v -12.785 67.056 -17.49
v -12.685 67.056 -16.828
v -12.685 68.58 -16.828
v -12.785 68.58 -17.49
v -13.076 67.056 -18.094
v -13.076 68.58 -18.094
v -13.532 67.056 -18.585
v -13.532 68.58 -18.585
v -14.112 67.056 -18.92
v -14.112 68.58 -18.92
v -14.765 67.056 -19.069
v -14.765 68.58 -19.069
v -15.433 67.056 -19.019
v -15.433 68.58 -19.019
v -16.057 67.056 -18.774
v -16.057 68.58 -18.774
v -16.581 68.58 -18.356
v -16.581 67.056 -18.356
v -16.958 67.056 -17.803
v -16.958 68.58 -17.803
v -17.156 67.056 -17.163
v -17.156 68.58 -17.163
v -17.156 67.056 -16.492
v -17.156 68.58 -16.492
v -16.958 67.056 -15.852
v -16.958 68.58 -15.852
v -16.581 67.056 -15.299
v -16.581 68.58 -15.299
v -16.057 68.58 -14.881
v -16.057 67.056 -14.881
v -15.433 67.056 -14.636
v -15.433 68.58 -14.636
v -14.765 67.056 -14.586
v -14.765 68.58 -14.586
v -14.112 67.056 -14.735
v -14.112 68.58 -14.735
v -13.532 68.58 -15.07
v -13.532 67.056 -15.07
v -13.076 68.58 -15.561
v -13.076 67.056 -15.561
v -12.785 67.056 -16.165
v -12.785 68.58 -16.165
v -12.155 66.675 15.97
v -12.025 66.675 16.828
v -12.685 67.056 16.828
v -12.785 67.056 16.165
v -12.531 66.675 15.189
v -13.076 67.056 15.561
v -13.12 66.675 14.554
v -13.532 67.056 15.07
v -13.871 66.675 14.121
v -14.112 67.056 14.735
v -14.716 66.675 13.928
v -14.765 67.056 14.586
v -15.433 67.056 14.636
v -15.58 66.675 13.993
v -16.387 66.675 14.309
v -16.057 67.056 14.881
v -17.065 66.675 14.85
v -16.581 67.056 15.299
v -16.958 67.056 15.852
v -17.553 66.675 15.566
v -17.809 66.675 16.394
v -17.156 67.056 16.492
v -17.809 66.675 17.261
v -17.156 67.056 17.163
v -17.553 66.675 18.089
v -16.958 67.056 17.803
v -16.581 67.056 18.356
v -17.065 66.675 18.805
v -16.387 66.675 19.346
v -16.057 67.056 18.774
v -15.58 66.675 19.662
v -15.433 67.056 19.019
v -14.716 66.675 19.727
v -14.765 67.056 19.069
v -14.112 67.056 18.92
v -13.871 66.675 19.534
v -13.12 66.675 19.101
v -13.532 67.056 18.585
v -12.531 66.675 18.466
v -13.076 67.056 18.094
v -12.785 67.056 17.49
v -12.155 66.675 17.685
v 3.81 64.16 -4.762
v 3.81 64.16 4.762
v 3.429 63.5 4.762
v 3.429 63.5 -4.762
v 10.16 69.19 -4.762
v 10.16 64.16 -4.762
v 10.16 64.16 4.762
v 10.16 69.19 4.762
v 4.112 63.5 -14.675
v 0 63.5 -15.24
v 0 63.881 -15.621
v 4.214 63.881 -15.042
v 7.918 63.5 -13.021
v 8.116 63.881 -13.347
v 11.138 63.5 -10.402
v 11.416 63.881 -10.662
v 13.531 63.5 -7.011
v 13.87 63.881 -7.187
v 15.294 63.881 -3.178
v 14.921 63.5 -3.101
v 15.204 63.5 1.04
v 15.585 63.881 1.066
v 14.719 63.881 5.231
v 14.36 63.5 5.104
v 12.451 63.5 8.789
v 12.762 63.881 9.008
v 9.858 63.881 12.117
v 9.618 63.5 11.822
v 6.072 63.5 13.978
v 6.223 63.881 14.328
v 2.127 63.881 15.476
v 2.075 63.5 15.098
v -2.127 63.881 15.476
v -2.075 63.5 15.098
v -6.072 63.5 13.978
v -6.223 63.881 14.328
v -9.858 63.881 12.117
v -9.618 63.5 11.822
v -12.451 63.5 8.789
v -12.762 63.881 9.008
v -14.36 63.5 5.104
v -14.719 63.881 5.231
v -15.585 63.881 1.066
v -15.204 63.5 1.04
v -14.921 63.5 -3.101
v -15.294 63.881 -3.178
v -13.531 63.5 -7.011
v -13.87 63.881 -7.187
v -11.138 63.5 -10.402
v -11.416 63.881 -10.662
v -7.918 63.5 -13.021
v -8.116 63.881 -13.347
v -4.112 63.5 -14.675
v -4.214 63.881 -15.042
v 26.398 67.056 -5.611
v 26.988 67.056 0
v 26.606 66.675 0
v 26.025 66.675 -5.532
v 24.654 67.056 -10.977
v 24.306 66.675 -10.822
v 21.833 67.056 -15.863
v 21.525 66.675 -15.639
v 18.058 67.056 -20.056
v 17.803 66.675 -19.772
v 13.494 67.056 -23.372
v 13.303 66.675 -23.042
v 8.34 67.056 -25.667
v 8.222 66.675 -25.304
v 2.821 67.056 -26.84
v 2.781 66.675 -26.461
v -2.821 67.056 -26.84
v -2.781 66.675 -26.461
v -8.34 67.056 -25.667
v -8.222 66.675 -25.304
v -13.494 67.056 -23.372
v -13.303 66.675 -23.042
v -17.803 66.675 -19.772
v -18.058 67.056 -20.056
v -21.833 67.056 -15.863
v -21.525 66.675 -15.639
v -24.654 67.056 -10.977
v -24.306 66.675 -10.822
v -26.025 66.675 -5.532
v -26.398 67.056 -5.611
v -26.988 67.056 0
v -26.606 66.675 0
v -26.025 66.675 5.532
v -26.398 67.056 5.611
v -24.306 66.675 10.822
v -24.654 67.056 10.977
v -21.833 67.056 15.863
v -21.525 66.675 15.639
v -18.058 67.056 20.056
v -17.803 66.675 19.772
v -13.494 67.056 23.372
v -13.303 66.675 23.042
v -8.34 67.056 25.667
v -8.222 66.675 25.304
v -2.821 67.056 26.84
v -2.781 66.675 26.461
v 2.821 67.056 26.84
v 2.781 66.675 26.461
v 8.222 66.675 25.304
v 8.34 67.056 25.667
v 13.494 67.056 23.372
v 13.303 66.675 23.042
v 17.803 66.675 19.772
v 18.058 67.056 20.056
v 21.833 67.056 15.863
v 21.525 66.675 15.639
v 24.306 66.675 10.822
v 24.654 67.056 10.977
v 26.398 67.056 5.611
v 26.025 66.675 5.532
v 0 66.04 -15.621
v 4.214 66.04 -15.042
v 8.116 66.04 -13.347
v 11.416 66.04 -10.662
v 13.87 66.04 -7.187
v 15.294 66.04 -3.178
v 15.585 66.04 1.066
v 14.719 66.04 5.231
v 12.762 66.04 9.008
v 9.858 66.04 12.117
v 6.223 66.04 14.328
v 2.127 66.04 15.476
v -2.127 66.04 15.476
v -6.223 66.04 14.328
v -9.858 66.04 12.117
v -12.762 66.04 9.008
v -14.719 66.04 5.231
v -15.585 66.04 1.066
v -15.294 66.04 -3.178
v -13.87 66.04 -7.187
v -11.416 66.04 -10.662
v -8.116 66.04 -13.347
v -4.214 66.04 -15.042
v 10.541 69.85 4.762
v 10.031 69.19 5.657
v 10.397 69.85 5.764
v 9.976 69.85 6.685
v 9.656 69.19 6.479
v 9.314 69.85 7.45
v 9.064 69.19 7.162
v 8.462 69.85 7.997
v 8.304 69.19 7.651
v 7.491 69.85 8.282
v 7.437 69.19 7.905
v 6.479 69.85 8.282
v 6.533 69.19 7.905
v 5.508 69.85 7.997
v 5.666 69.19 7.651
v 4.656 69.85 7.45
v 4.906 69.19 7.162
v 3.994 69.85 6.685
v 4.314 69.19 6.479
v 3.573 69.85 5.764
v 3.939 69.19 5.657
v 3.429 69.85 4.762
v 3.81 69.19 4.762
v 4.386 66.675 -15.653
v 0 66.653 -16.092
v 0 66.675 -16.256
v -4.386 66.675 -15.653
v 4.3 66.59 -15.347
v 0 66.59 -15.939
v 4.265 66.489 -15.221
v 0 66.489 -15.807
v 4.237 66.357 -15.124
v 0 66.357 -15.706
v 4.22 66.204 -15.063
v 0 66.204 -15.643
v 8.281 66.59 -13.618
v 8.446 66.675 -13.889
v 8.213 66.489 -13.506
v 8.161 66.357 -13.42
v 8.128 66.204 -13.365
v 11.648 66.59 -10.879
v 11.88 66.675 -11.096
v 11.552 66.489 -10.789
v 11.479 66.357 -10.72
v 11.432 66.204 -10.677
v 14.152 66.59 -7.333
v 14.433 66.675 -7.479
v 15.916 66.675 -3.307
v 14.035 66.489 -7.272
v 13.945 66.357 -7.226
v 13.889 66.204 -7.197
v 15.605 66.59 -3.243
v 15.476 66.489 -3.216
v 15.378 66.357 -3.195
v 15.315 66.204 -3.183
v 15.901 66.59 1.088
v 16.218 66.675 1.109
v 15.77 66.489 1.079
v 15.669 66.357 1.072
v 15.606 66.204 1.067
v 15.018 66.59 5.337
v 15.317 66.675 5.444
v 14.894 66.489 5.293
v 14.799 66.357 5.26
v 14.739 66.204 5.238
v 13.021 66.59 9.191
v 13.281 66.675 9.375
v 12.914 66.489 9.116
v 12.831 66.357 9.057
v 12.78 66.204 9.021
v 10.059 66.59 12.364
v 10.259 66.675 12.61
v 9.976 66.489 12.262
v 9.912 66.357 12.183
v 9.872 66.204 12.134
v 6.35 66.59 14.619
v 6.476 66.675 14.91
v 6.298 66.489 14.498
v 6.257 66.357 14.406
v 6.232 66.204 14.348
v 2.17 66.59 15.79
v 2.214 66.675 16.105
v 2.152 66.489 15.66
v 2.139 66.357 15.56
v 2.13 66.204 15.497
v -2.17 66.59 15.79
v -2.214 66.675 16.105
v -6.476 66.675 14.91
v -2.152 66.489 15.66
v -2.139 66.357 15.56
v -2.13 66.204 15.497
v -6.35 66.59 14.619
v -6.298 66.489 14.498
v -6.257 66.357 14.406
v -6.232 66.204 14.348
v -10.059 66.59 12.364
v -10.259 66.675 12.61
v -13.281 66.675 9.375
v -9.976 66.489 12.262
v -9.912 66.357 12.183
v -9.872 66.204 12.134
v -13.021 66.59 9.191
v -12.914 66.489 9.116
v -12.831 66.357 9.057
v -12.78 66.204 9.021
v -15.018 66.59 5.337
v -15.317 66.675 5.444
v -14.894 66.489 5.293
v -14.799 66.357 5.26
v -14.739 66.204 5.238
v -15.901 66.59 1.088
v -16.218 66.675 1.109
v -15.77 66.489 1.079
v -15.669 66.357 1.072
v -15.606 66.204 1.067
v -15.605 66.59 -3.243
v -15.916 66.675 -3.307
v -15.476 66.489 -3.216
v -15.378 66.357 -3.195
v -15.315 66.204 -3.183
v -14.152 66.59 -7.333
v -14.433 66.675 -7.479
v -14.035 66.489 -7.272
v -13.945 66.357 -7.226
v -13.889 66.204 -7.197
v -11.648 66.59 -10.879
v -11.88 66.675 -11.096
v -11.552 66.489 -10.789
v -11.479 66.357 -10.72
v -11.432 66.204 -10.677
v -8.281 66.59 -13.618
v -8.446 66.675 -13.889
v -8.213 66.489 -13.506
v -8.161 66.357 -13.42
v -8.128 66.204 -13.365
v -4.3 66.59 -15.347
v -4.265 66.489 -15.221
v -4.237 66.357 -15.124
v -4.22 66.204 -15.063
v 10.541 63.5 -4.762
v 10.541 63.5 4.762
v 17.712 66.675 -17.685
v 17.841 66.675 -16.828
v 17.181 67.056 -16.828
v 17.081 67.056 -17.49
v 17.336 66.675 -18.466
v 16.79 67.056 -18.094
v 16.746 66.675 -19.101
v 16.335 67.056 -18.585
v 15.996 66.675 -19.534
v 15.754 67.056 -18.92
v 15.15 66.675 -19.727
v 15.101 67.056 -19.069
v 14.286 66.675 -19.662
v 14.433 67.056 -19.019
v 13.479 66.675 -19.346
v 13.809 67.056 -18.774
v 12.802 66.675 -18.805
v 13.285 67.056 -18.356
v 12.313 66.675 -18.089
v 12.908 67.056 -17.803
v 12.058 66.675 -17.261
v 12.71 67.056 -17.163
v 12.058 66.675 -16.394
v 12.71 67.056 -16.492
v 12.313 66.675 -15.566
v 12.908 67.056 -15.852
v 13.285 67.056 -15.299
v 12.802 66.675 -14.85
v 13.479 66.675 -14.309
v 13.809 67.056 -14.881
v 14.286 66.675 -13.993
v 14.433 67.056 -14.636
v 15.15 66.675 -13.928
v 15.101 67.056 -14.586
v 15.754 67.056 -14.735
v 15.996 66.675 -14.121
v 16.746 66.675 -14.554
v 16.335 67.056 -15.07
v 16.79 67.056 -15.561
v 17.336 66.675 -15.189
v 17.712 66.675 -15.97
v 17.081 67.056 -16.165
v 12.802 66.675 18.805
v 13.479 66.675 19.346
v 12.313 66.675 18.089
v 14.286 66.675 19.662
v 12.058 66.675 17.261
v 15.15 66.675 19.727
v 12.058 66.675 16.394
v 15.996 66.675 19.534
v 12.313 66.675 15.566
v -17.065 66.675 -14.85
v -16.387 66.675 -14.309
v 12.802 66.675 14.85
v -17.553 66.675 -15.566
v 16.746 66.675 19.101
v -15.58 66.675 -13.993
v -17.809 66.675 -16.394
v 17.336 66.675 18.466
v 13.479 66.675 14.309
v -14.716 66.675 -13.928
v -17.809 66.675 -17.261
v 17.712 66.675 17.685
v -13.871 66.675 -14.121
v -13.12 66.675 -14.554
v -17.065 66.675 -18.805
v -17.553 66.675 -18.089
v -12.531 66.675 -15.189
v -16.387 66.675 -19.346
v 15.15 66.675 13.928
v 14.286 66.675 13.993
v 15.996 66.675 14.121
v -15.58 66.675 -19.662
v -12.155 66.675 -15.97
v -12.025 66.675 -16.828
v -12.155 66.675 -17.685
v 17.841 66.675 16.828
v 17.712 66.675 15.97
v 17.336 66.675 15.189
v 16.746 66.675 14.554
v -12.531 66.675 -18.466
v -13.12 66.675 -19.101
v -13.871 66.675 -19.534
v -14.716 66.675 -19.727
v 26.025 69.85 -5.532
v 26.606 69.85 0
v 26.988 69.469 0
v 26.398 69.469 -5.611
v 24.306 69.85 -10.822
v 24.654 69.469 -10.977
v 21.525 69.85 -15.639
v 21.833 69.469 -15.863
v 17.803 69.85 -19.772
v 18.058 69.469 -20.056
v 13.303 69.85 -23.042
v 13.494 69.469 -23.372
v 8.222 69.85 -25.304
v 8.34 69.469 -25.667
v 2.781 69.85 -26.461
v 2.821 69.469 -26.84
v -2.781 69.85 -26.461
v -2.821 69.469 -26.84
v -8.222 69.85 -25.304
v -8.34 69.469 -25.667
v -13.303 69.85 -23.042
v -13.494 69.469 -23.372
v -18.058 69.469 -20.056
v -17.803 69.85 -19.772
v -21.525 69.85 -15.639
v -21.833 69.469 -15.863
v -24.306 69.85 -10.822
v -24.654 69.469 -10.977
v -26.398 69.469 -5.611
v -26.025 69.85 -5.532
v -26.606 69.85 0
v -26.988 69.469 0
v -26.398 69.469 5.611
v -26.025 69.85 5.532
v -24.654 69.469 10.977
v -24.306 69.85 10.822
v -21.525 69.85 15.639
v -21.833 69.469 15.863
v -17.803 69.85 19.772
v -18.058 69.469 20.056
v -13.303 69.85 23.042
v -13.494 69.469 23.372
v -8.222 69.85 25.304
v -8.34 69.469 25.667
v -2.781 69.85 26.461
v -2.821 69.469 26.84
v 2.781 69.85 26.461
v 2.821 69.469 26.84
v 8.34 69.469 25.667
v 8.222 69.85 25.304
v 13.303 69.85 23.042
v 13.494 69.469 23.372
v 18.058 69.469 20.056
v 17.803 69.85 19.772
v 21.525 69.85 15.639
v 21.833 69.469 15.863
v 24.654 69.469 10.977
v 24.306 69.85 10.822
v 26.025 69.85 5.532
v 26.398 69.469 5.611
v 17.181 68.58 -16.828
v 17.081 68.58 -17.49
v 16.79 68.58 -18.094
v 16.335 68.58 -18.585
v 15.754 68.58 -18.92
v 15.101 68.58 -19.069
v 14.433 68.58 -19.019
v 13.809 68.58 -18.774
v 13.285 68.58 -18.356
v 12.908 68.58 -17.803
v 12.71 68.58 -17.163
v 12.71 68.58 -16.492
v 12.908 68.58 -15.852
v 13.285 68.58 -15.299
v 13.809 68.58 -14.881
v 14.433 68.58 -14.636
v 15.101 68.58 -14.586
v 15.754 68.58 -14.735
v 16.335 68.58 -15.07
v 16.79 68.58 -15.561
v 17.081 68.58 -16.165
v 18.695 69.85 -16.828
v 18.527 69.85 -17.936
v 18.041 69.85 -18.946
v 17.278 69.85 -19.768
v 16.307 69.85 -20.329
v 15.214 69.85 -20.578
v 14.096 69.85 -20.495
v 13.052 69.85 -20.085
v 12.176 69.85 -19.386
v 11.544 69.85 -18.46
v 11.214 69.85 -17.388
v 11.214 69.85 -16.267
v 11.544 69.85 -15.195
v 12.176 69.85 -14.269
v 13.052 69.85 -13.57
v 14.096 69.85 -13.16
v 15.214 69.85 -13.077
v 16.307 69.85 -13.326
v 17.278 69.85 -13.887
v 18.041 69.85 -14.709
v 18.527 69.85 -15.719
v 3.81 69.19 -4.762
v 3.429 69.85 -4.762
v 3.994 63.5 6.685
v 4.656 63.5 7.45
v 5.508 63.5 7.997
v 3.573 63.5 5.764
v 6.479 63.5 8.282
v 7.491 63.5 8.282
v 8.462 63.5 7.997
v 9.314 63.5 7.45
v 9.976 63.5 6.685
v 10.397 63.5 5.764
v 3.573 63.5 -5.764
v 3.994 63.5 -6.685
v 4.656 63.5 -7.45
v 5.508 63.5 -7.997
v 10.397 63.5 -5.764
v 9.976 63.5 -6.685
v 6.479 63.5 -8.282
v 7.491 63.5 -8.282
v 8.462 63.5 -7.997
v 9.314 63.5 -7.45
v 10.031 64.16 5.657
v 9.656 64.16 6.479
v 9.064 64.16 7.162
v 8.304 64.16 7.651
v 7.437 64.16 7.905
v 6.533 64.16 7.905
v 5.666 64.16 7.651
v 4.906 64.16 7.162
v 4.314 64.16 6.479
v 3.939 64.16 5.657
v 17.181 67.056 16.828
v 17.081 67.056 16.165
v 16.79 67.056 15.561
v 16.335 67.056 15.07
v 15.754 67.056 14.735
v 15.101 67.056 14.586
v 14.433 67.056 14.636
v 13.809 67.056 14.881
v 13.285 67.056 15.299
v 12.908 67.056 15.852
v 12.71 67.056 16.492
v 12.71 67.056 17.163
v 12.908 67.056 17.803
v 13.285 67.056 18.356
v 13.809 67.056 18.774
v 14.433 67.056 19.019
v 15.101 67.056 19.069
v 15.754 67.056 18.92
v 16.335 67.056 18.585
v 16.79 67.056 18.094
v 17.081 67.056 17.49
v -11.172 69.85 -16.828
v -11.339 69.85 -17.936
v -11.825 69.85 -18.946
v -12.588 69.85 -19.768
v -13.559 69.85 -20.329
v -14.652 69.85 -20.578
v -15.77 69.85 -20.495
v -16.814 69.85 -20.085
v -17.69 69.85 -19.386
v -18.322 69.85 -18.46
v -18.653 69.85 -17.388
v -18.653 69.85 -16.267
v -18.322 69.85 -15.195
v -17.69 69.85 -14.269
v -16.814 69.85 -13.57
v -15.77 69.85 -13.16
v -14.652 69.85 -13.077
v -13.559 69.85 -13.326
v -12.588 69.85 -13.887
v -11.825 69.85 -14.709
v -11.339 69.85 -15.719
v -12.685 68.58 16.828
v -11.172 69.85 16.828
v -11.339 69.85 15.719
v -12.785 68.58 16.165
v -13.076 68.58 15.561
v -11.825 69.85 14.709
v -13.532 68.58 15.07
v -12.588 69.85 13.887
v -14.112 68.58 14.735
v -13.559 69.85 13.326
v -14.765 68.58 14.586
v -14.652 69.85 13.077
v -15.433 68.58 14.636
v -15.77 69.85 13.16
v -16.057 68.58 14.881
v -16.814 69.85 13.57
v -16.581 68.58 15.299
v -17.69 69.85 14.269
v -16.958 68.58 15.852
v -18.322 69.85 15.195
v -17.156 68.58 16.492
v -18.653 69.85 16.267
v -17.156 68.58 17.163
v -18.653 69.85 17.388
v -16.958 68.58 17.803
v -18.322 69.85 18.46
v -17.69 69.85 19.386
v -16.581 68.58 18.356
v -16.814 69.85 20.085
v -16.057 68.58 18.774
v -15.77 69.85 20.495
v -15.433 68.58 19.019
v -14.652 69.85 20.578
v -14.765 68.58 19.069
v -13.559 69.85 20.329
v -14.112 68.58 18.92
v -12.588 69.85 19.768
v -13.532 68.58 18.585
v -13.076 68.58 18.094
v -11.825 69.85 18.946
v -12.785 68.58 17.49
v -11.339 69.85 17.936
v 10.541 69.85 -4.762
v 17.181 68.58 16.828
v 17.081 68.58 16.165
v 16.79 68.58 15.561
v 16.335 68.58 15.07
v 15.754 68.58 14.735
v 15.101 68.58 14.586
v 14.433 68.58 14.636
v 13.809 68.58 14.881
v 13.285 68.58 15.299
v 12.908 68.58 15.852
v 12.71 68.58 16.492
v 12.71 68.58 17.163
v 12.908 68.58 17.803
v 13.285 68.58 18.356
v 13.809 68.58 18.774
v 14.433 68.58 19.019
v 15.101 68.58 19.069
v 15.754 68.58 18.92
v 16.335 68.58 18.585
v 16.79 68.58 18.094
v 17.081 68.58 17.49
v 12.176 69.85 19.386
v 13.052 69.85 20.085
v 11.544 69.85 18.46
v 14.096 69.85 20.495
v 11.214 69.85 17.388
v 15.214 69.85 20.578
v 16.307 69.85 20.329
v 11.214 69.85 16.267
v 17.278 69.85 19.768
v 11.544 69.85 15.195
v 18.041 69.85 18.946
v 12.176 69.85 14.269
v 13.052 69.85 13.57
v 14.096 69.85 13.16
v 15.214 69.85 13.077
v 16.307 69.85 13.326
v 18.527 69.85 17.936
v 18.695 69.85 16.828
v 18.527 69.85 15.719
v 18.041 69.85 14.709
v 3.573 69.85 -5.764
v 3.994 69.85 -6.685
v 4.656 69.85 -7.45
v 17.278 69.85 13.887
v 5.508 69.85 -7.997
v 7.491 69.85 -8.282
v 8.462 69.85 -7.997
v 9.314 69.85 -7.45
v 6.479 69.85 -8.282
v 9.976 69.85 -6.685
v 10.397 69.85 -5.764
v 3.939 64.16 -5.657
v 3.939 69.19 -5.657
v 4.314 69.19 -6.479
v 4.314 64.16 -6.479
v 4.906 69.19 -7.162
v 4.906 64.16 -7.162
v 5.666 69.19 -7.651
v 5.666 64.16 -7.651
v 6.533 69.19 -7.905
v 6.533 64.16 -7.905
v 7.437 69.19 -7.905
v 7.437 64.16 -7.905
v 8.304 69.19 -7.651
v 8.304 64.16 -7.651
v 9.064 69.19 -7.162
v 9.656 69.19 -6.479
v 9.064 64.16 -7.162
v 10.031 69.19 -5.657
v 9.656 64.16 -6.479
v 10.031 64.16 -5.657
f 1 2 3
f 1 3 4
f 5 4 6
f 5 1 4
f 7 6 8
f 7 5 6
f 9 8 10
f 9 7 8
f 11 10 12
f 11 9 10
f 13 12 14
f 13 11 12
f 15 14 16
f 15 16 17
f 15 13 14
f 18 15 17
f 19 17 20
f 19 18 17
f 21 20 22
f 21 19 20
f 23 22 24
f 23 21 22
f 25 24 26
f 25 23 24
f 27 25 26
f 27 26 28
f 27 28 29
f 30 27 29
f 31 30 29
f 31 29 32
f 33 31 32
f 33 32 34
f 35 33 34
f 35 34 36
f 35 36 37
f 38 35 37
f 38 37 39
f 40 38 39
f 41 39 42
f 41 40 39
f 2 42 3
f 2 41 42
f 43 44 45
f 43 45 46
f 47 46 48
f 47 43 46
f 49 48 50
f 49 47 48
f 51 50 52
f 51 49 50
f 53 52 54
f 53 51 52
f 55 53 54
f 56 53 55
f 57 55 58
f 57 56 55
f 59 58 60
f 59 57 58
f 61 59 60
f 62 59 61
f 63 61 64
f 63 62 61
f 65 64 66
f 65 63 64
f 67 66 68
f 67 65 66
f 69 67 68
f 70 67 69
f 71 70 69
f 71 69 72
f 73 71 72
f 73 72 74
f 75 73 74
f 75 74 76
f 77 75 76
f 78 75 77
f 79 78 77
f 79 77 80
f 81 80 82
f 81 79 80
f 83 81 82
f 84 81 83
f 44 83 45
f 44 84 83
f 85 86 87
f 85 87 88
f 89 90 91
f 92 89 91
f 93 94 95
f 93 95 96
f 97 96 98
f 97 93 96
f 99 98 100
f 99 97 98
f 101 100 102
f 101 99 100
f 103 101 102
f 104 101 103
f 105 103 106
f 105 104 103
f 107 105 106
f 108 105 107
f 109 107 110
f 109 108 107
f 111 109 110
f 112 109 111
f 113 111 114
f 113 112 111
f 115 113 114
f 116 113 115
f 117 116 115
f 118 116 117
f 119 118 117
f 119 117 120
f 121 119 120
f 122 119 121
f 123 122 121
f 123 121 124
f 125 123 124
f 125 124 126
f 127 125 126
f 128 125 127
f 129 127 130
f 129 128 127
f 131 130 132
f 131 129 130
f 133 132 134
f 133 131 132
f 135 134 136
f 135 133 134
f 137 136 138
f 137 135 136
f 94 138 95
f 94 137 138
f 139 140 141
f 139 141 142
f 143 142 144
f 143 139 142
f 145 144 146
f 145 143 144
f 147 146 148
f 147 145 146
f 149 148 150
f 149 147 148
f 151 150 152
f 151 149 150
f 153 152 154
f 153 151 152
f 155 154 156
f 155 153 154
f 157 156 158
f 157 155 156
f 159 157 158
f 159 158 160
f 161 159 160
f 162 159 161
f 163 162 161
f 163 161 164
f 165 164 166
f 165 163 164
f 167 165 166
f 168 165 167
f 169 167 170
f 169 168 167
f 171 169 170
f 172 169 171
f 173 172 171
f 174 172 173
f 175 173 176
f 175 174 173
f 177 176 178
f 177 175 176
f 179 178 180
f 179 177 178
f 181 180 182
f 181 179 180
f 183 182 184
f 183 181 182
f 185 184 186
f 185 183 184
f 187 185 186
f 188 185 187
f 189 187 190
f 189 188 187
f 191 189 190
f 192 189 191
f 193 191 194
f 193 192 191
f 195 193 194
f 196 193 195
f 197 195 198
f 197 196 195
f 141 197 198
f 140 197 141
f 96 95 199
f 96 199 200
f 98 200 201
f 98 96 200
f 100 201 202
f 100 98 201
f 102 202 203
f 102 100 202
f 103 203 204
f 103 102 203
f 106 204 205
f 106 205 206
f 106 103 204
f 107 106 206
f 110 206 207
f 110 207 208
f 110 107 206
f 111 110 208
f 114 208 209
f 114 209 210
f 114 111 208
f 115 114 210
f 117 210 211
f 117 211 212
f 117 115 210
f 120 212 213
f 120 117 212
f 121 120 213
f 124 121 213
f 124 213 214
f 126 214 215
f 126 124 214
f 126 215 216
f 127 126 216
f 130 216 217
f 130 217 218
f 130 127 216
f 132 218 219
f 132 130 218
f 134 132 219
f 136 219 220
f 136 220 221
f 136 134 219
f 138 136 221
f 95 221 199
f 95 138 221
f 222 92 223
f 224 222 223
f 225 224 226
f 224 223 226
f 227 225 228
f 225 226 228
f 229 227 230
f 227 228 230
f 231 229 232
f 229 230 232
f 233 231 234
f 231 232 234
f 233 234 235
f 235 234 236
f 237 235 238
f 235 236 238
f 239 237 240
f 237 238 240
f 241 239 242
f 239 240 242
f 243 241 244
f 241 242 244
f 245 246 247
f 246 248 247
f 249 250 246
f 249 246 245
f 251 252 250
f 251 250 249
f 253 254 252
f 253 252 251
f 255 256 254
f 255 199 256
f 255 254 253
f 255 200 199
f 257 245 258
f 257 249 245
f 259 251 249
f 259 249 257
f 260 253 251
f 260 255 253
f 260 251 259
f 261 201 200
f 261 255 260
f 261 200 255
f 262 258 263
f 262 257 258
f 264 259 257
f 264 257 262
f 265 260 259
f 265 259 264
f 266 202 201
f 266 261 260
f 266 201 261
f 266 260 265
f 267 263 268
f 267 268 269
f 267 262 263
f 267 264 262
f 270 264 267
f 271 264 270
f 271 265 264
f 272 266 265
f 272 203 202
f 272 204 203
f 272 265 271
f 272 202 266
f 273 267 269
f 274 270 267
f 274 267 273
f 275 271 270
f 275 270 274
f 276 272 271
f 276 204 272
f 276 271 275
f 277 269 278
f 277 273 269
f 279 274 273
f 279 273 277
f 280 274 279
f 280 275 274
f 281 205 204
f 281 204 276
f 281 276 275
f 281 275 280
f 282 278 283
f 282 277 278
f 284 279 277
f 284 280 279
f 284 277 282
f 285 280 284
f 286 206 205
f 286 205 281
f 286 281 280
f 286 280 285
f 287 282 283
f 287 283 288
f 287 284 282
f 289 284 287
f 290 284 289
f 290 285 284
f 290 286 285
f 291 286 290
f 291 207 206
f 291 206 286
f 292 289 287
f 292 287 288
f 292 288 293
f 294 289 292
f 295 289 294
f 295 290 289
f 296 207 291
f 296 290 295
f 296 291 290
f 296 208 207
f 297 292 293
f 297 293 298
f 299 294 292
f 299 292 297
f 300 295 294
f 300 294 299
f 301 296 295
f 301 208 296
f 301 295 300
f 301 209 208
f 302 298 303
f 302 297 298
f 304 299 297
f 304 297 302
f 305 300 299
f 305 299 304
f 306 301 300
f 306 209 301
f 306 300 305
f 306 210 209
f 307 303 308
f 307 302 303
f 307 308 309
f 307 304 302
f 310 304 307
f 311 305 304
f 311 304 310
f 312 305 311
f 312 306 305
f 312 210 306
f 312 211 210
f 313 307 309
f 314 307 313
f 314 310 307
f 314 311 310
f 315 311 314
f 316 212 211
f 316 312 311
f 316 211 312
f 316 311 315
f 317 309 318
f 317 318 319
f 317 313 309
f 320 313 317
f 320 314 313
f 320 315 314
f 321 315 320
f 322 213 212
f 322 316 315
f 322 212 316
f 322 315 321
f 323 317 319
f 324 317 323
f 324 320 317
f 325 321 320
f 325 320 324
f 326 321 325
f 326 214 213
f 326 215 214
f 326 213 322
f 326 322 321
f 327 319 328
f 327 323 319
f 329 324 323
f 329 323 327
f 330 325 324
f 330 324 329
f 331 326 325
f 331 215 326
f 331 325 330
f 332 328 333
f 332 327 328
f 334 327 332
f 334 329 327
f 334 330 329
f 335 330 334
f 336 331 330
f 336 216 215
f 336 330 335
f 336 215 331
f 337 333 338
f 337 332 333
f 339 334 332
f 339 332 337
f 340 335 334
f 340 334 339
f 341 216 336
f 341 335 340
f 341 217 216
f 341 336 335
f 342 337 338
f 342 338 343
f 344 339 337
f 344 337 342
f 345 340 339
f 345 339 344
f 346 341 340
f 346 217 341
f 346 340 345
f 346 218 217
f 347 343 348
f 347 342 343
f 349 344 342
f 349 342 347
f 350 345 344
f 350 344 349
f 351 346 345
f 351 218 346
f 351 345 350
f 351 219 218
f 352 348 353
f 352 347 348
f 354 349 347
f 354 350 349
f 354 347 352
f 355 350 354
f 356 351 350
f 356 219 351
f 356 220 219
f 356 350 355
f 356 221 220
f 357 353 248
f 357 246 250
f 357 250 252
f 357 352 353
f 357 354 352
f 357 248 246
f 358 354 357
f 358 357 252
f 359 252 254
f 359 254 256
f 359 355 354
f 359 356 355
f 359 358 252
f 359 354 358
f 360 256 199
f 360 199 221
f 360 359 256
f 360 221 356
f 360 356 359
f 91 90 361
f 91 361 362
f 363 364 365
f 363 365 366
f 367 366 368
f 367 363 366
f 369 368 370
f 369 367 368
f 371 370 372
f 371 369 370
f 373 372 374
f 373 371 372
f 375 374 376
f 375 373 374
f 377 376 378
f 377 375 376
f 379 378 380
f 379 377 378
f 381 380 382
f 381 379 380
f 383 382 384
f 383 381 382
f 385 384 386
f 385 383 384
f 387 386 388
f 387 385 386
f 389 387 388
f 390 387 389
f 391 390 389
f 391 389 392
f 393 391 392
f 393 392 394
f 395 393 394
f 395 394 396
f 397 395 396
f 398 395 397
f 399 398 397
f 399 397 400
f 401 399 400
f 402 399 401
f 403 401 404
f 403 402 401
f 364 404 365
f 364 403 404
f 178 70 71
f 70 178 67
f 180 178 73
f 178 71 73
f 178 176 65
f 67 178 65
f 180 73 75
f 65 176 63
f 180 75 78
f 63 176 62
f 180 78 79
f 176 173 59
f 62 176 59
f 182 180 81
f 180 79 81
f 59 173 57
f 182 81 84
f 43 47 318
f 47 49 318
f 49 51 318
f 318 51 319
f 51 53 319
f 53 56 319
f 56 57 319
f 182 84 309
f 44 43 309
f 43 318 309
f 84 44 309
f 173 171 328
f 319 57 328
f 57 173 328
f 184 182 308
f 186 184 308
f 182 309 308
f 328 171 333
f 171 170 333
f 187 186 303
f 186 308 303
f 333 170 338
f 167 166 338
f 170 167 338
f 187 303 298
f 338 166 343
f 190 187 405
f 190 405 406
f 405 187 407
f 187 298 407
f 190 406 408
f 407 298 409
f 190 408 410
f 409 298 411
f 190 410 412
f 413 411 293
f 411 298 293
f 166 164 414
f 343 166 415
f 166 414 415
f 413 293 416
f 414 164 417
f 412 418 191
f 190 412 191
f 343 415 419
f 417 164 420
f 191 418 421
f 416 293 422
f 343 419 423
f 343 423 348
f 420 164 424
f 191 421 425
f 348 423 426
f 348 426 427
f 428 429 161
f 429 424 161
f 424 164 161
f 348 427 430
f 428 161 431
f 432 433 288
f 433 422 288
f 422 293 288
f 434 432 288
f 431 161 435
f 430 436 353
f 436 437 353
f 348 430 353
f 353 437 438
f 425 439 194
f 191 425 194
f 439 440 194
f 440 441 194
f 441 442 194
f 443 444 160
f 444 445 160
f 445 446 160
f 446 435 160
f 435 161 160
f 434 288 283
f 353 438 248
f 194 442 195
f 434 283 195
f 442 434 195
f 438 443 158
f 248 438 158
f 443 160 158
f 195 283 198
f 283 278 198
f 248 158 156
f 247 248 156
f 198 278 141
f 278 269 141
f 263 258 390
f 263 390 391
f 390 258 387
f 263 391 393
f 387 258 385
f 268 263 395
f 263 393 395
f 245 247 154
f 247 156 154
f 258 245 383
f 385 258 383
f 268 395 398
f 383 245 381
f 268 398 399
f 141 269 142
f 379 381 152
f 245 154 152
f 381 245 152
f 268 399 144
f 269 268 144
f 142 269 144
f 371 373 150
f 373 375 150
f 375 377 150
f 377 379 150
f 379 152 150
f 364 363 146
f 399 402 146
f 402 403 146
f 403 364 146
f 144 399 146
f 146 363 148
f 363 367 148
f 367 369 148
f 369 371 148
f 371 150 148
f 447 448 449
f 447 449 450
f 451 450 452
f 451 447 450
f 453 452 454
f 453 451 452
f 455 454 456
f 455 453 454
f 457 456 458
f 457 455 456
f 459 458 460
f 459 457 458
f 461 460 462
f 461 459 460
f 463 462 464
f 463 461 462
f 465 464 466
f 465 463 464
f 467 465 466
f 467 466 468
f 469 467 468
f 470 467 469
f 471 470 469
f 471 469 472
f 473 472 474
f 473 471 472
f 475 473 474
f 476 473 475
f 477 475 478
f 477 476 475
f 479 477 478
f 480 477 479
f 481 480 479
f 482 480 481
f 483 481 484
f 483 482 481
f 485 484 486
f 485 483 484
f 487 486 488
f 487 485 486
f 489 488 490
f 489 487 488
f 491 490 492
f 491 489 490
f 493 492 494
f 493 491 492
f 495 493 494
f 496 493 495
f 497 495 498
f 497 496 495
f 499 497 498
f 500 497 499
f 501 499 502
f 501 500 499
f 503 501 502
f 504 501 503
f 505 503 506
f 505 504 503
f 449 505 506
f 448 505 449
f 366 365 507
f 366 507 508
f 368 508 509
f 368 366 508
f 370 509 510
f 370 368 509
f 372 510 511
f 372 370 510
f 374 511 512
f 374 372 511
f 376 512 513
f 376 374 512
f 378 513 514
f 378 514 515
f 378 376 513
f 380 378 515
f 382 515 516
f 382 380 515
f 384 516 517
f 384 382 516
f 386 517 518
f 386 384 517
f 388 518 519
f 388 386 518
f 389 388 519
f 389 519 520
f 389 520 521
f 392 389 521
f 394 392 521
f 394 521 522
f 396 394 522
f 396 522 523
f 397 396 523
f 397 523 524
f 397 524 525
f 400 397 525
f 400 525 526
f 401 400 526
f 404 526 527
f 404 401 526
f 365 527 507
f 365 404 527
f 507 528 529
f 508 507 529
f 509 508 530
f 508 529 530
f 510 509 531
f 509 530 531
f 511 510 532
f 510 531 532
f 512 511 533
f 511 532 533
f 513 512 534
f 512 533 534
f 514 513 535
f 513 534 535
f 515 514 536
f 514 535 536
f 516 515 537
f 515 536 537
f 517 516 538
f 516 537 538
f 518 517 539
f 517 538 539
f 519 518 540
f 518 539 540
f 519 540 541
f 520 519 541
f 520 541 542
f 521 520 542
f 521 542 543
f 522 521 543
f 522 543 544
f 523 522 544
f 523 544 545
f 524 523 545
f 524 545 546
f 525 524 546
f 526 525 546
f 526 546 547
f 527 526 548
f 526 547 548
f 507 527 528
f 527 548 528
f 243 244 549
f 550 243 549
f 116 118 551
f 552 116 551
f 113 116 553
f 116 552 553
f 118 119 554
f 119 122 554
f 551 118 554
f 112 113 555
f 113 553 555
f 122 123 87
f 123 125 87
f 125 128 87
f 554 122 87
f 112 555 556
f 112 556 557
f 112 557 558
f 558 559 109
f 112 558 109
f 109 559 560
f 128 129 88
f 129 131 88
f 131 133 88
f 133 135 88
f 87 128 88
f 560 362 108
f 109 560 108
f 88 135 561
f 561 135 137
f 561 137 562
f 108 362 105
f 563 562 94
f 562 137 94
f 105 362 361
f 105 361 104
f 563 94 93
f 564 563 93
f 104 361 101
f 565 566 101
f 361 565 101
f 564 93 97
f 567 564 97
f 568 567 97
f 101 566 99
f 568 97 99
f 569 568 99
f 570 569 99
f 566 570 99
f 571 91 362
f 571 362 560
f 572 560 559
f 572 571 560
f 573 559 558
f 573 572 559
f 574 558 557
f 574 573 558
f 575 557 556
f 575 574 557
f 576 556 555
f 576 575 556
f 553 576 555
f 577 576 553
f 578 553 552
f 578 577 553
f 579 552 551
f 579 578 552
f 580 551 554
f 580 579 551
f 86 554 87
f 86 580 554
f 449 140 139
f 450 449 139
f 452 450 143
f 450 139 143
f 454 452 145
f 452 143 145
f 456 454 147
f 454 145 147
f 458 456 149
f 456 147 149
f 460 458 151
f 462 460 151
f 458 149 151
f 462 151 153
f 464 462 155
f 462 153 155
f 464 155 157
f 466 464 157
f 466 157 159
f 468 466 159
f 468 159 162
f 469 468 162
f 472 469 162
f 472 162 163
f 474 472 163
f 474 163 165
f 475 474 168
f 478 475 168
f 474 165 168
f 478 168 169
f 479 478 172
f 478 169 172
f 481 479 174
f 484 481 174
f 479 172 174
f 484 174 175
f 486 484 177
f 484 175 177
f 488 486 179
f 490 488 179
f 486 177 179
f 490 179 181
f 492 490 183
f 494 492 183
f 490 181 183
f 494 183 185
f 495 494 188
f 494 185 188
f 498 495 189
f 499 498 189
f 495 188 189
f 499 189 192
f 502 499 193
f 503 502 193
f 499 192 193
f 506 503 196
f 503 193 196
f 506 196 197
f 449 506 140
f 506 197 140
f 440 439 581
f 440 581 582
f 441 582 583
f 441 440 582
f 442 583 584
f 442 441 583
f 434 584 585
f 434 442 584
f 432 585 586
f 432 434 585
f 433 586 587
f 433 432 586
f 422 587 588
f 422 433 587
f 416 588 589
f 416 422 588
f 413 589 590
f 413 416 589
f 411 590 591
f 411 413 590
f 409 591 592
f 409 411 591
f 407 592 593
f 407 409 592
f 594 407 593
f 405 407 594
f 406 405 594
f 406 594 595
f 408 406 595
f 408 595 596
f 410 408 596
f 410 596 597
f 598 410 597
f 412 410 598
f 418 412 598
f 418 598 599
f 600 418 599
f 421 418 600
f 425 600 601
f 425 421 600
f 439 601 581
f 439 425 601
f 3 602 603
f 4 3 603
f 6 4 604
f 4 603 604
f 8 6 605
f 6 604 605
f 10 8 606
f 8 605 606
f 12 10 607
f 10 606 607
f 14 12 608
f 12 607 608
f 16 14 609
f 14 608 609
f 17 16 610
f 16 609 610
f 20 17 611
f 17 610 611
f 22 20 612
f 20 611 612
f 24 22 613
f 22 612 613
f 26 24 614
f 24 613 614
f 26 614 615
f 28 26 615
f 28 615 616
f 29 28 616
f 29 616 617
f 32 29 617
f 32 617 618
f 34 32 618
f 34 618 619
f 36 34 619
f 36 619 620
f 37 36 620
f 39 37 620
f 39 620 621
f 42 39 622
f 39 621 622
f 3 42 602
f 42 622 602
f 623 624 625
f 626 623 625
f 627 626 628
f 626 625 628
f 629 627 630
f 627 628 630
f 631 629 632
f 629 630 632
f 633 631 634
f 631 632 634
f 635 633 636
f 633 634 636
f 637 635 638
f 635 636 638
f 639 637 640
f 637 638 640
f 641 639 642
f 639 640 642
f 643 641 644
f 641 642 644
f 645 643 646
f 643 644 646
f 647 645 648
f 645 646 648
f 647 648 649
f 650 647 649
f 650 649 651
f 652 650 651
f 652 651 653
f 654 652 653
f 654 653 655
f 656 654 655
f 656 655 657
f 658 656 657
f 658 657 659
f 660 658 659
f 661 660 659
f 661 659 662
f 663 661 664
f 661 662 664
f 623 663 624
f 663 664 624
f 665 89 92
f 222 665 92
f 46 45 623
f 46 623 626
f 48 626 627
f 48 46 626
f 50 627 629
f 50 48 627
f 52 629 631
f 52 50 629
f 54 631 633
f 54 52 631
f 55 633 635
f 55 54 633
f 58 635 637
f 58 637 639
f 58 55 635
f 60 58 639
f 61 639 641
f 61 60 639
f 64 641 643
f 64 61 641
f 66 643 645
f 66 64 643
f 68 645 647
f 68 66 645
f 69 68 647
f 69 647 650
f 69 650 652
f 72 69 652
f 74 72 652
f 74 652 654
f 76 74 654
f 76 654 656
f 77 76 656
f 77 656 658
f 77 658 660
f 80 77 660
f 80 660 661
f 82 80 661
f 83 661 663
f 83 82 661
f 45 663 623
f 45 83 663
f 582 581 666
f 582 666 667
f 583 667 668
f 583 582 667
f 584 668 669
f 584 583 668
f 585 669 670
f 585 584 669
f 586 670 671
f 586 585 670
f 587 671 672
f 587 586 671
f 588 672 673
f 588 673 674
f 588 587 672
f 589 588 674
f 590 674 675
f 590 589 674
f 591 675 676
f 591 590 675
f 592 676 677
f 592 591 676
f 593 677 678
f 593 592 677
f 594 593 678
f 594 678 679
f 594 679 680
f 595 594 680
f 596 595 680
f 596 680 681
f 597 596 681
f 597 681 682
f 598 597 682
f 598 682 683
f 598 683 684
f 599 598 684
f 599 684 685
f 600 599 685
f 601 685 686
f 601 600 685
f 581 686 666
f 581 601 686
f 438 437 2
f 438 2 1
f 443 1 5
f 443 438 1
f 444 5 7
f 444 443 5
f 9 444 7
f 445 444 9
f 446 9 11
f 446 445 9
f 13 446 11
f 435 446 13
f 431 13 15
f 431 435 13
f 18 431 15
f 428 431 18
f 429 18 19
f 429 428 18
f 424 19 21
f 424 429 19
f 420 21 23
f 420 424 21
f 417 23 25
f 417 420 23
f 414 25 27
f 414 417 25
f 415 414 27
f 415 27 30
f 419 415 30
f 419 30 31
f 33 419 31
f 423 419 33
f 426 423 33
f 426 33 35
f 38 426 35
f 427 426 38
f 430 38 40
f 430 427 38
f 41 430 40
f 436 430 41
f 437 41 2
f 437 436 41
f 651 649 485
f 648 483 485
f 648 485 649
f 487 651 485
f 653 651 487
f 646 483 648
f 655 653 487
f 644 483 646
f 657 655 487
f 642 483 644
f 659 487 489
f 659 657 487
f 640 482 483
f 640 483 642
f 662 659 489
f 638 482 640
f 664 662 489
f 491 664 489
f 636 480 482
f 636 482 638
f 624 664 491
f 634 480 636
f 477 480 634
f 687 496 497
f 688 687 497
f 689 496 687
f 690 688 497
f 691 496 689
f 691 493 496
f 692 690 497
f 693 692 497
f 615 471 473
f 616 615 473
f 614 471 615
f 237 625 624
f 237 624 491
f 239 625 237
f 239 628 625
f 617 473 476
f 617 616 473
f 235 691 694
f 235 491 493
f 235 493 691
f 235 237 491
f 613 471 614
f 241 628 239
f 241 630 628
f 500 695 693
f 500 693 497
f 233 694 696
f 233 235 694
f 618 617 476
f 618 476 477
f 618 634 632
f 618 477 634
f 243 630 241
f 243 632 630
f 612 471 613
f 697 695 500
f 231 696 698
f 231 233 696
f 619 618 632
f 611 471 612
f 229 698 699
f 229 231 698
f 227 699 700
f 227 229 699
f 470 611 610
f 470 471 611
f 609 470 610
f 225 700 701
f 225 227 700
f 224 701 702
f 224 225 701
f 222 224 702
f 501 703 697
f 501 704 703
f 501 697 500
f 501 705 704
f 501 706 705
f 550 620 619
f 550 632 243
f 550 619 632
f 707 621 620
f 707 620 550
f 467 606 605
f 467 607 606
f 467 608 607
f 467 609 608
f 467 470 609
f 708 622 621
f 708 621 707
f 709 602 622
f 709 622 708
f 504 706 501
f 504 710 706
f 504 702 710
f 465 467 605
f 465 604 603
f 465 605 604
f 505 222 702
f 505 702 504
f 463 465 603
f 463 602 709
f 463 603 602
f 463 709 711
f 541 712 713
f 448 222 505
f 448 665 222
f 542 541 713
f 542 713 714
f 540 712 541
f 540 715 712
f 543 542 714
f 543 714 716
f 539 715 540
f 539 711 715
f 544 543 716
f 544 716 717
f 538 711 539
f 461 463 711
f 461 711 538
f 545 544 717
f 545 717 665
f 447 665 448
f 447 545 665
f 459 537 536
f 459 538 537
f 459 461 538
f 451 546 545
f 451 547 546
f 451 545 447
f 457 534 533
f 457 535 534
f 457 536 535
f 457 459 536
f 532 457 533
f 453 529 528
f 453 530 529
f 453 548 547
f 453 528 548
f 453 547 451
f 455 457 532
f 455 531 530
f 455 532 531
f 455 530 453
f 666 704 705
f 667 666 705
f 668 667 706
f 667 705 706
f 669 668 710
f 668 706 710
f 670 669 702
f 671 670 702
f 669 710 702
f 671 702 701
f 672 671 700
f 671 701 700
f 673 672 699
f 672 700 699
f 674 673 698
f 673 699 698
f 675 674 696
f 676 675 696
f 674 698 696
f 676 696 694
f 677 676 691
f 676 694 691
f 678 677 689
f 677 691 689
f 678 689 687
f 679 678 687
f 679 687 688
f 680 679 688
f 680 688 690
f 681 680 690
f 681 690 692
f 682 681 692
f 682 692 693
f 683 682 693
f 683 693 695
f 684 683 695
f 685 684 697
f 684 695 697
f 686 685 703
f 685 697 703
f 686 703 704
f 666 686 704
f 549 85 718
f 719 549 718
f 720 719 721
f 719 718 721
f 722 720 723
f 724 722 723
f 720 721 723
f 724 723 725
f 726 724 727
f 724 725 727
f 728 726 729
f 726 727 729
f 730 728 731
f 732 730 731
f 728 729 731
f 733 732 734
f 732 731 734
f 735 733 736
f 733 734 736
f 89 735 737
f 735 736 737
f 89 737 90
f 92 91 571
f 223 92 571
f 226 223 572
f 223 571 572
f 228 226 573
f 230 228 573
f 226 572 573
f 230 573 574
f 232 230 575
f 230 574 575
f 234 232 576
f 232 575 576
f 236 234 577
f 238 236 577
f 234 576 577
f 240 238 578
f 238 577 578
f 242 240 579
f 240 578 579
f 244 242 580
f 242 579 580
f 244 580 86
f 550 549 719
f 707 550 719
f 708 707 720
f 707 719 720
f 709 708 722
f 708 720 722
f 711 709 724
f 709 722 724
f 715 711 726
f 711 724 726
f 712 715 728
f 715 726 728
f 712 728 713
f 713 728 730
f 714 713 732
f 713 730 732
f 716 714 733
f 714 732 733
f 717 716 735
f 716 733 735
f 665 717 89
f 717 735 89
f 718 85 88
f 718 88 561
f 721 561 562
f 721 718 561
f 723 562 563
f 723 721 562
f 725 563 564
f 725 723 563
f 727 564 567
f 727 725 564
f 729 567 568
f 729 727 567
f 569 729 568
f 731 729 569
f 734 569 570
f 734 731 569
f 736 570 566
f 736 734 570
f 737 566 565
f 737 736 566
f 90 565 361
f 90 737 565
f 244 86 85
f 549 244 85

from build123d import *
from OCP.BRepFilletAPI import BRepFilletAPI_MakeChamfer

# Parameters (mm, degrees)
STOCK_DGT_START                               = 66.675
STOCK_DGT_INSIDE_SWERVE_STRUCTURE_SM_2_R      = 26.9875
STOCK_DGT_INSIDE_SWERVE_STRUCTURE_SM_2_R_2    = 2.2479
STOCK_DGT_INSIDE_SWERVE_STRUCTURE_SMALL_DEPTH = 3.175
STOCK_DGT_START_2                             = 63.5
STOCK_DGT_INSIDE_SWERVE_STRUCTURE_SM_3_O_R    = 15.875
STOCK_DGT_INSIDE_SWERVE_STRUCTURE_SM_3_DEPTH  = 3.175
SKETCH1_R                                     = 15.875
SKETCH1_R_2                                   = 15.621
CUT_EXTRUDE1_DEPTH                            = 3.175
FILLET1_R                                     = 0.635
CHAMFER1_SIZE                                 = 0.381
CHAMFER2_SIZE                                 = 0.381
CHAMFER2_SIZE2                                = 0.659911358
CHAMFER3_SIZE                                 = 1.27
CHAMFER3_SIZE2                                = 1.513527063


# Read off the part's stored shape, not the designer's step: Stock-DGT inside swerve structure Small Bearing-1
with BuildPart() as part:
    # Stock-DGT inside swerve structure Sm 2 → Stock-DGT inside swerve structure Small Bearing-1 (new body)
    with BuildSketch(Plane(origin=(0, 0, 0), x_dir=(1, 0, 0), z_dir=(0, 1, 0)).offset(STOCK_DGT_START)):
        Circle(STOCK_DGT_INSIDE_SWERVE_STRUCTURE_SM_2_R)
        with Locations((-14.933176064, -16.8275)):
            Circle(STOCK_DGT_INSIDE_SWERVE_STRUCTURE_SM_2_R_2, mode=Mode.SUBTRACT)
        with Locations((14.933176064, -16.8275)):
            Circle(STOCK_DGT_INSIDE_SWERVE_STRUCTURE_SM_2_R_2, mode=Mode.SUBTRACT)
        with Locations((-14.933176064, 16.8275)):
            Circle(STOCK_DGT_INSIDE_SWERVE_STRUCTURE_SM_2_R_2, mode=Mode.SUBTRACT)
        with Locations((14.933176064, 16.8275)):
            Circle(STOCK_DGT_INSIDE_SWERVE_STRUCTURE_SM_2_R_2, mode=Mode.SUBTRACT)
        with BuildLine():
            Line((3.81, -4.7625), (3.81, 4.7625))
            ThreePointArc((3.81, 4.7625), (6.985, 7.9375), (10.16, 4.7625))
            Line((10.16, 4.7625), (10.16, -4.7625))
            ThreePointArc((10.16, -4.7625), (6.985, -7.9375), (3.81, -4.7625))
        make_face(mode=Mode.SUBTRACT)
    extrude(amount=STOCK_DGT_INSIDE_SWERVE_STRUCTURE_SMALL_DEPTH)

    # Stock-DGT inside swerve structure Sm 3 o → Stock-DGT inside swerve structure Sm 3 (add)
    with BuildSketch(Plane(origin=(0, 0, 0), x_dir=(1, 0, 0), z_dir=(0, 1, 0)).offset(STOCK_DGT_START_2)):
        Circle(STOCK_DGT_INSIDE_SWERVE_STRUCTURE_SM_3_O_R)
        with BuildLine():
            ThreePointArc((10.16, -4.7625), (6.985, -7.9375), (3.81, -4.7625))
            Line((3.81, -4.7625), (3.81, 4.7625))
            ThreePointArc((3.81, 4.7625), (6.985, 7.9375), (10.16, 4.7625))
            Line((10.16, 4.7625), (10.16, -4.7625))
        make_face(mode=Mode.SUBTRACT)
    extrude(amount=STOCK_DGT_INSIDE_SWERVE_STRUCTURE_SM_3_DEPTH)

    # Sketch1 → Cut-Extrude1 (cut)
    with BuildSketch(Plane.XZ.offset(-63.5)):
        Circle(SKETCH1_R)
        with Locations(Location((0, 0, 0), (0, 0, 270))):
            Circle(SKETCH1_R_2, mode=Mode.SUBTRACT)
    extrude(amount=-CUT_EXTRUDE1_DEPTH, mode=Mode.SUBTRACT)

    # Fillet1
    fillet1_edges = [part.edges().sort_by_distance(p)[0] for p in [
        (0, 66.675, 15.621),
    ]]
    fillet(fillet1_edges, radius=FILLET1_R)

    # Chamfer1
    chamfer1_edges = [part.edges().sort_by_distance(p)[0] for p in [
        (-26.9875, 66.675, 0),
        (-26.9875, 69.85, 0),
        (0, 63.5, 15.621),
    ]]
    chamfer(chamfer1_edges, length=CHAMFER1_SIZE)

    # Chamfer2: one chamfer whose edges measure the first distance from different faces: ONE call of the kernel's chamfer builder (chamfer() names one face for all edges)
    chamfer2_edges_1 = [part.edges().sort_by_distance(p)[0] for p in [
        (-17.181076064, 66.675, -16.8275),
    ]]
    chamfer2_side_1 = [part.faces().sort_by_distance(p)[0] for p in [
        (-17.181076064, 68.2625, -16.8275),
    ]]
    chamfer2_edges_2 = [part.edges().sort_by_distance(p)[0] for p in [
        (-17.181076064, 66.675, 16.8275),
    ]]
    chamfer2_side_2 = [part.faces().sort_by_distance(p)[0] for p in [
        (-17.181076064, 68.2625, 16.8275),
    ]]
    chamfer2_edges_3 = [part.edges().sort_by_distance(p)[0] for p in [
        (10.16, 63.5, 0),
        (6.985, 63.5, -7.9375),
        (3.81, 63.5, 0),
        (6.985, 63.5, 7.9375),
    ]]
    chamfer2_side_3 = [part.faces().sort_by_distance(p)[0] for p in [
        (-1.009698226, 63.5, 0),
    ]]
    chamfer2_edges_4 = [part.edges().sort_by_distance(p)[0] for p in [
        (6.985, 69.85, 7.9375),
        (10.16, 69.85, 0),
        (6.985, 69.85, -7.9375),
        (3.81, 69.85, 0),
    ]]
    chamfer2_side_4 = [part.faces().sort_by_distance(p)[0] for p in [
        (-0.311216165, 69.85, 0),
    ]]
    chamfer2_edges_5 = [part.edges().sort_by_distance(p)[0] for p in [
        (12.685276064, 66.675, 16.8275),
    ]]
    chamfer2_side_5 = [part.faces().sort_by_distance(p)[0] for p in [
        (12.685276064, 68.2625, 16.8275),
    ]]
    chamfer2_edges_6 = [part.edges().sort_by_distance(p)[0] for p in [
        (12.685276064, 66.675, -16.8275),
    ]]
    chamfer2_side_6 = [part.faces().sort_by_distance(p)[0] for p in [
        (12.685276064, 68.2625, -16.8275),
    ]]
    chamfer2 = BRepFilletAPI_MakeChamfer(part.part.solid().wrapped)
    for e in chamfer2_edges_1:
        chamfer2.Add(CHAMFER2_SIZE, CHAMFER2_SIZE2, e.wrapped, chamfer2_side_1[0].wrapped)  # the first distance lies on this face
    for e in chamfer2_edges_2:
        chamfer2.Add(CHAMFER2_SIZE, CHAMFER2_SIZE2, e.wrapped, chamfer2_side_2[0].wrapped)  # the first distance lies on this face
    for e in chamfer2_edges_3:
        chamfer2.Add(CHAMFER2_SIZE, CHAMFER2_SIZE2, e.wrapped, chamfer2_side_3[0].wrapped)  # the first distance lies on this face
    for e in chamfer2_edges_4:
        chamfer2.Add(CHAMFER2_SIZE, CHAMFER2_SIZE2, e.wrapped, chamfer2_side_4[0].wrapped)  # the first distance lies on this face
    for e in chamfer2_edges_5:
        chamfer2.Add(CHAMFER2_SIZE, CHAMFER2_SIZE2, e.wrapped, chamfer2_side_5[0].wrapped)  # the first distance lies on this face
    for e in chamfer2_edges_6:
        chamfer2.Add(CHAMFER2_SIZE, CHAMFER2_SIZE2, e.wrapped, chamfer2_side_6[0].wrapped)  # the first distance lies on this face
    add(Compound.cast(chamfer2.Shape()), mode=Mode.REPLACE)

    # Chamfer3: one chamfer whose edges measure the first distance from different faces: ONE call of the kernel's chamfer builder (chamfer() names one face for all edges)
    chamfer3_edges_1 = [part.edges().sort_by_distance(p)[0] for p in [
        (-17.181076064, 69.85, -16.8275),
    ]]
    chamfer3_side_1 = [part.faces().sort_by_distance(p)[0] for p in [
        (-17.181076064, 68.453, -16.8275),
    ]]
    chamfer3_edges_2 = [part.edges().sort_by_distance(p)[0] for p in [
        (-17.181076064, 69.85, 16.8275),
    ]]
    chamfer3_side_2 = [part.faces().sort_by_distance(p)[0] for p in [
        (-17.181076064, 68.453, 16.8275),
    ]]
    chamfer3_edges_3 = [part.edges().sort_by_distance(p)[0] for p in [
        (12.685276064, 69.85, 16.8275),
    ]]
    chamfer3_side_3 = [part.faces().sort_by_distance(p)[0] for p in [
        (12.685276064, 68.453, 16.8275),
    ]]
    chamfer3_edges_4 = [part.edges().sort_by_distance(p)[0] for p in [
        (12.685276064, 69.85, -16.8275),
    ]]
    chamfer3_side_4 = [part.faces().sort_by_distance(p)[0] for p in [
        (12.685276064, 68.453, -16.8275),
    ]]
    chamfer3 = BRepFilletAPI_MakeChamfer(part.part.solid().wrapped)
    for e in chamfer3_edges_1:
        chamfer3.Add(CHAMFER3_SIZE, CHAMFER3_SIZE2, e.wrapped, chamfer3_side_1[0].wrapped)  # the first distance lies on this face
    for e in chamfer3_edges_2:
        chamfer3.Add(CHAMFER3_SIZE, CHAMFER3_SIZE2, e.wrapped, chamfer3_side_2[0].wrapped)  # the first distance lies on this face
    for e in chamfer3_edges_3:
        chamfer3.Add(CHAMFER3_SIZE, CHAMFER3_SIZE2, e.wrapped, chamfer3_side_3[0].wrapped)  # the first distance lies on this face
    for e in chamfer3_edges_4:
        chamfer3.Add(CHAMFER3_SIZE, CHAMFER3_SIZE2, e.wrapped, chamfer3_side_4[0].wrapped)  # the first distance lies on this face
    add(Compound.cast(chamfer3.Shape()), mode=Mode.REPLACE)


solid = part.part
